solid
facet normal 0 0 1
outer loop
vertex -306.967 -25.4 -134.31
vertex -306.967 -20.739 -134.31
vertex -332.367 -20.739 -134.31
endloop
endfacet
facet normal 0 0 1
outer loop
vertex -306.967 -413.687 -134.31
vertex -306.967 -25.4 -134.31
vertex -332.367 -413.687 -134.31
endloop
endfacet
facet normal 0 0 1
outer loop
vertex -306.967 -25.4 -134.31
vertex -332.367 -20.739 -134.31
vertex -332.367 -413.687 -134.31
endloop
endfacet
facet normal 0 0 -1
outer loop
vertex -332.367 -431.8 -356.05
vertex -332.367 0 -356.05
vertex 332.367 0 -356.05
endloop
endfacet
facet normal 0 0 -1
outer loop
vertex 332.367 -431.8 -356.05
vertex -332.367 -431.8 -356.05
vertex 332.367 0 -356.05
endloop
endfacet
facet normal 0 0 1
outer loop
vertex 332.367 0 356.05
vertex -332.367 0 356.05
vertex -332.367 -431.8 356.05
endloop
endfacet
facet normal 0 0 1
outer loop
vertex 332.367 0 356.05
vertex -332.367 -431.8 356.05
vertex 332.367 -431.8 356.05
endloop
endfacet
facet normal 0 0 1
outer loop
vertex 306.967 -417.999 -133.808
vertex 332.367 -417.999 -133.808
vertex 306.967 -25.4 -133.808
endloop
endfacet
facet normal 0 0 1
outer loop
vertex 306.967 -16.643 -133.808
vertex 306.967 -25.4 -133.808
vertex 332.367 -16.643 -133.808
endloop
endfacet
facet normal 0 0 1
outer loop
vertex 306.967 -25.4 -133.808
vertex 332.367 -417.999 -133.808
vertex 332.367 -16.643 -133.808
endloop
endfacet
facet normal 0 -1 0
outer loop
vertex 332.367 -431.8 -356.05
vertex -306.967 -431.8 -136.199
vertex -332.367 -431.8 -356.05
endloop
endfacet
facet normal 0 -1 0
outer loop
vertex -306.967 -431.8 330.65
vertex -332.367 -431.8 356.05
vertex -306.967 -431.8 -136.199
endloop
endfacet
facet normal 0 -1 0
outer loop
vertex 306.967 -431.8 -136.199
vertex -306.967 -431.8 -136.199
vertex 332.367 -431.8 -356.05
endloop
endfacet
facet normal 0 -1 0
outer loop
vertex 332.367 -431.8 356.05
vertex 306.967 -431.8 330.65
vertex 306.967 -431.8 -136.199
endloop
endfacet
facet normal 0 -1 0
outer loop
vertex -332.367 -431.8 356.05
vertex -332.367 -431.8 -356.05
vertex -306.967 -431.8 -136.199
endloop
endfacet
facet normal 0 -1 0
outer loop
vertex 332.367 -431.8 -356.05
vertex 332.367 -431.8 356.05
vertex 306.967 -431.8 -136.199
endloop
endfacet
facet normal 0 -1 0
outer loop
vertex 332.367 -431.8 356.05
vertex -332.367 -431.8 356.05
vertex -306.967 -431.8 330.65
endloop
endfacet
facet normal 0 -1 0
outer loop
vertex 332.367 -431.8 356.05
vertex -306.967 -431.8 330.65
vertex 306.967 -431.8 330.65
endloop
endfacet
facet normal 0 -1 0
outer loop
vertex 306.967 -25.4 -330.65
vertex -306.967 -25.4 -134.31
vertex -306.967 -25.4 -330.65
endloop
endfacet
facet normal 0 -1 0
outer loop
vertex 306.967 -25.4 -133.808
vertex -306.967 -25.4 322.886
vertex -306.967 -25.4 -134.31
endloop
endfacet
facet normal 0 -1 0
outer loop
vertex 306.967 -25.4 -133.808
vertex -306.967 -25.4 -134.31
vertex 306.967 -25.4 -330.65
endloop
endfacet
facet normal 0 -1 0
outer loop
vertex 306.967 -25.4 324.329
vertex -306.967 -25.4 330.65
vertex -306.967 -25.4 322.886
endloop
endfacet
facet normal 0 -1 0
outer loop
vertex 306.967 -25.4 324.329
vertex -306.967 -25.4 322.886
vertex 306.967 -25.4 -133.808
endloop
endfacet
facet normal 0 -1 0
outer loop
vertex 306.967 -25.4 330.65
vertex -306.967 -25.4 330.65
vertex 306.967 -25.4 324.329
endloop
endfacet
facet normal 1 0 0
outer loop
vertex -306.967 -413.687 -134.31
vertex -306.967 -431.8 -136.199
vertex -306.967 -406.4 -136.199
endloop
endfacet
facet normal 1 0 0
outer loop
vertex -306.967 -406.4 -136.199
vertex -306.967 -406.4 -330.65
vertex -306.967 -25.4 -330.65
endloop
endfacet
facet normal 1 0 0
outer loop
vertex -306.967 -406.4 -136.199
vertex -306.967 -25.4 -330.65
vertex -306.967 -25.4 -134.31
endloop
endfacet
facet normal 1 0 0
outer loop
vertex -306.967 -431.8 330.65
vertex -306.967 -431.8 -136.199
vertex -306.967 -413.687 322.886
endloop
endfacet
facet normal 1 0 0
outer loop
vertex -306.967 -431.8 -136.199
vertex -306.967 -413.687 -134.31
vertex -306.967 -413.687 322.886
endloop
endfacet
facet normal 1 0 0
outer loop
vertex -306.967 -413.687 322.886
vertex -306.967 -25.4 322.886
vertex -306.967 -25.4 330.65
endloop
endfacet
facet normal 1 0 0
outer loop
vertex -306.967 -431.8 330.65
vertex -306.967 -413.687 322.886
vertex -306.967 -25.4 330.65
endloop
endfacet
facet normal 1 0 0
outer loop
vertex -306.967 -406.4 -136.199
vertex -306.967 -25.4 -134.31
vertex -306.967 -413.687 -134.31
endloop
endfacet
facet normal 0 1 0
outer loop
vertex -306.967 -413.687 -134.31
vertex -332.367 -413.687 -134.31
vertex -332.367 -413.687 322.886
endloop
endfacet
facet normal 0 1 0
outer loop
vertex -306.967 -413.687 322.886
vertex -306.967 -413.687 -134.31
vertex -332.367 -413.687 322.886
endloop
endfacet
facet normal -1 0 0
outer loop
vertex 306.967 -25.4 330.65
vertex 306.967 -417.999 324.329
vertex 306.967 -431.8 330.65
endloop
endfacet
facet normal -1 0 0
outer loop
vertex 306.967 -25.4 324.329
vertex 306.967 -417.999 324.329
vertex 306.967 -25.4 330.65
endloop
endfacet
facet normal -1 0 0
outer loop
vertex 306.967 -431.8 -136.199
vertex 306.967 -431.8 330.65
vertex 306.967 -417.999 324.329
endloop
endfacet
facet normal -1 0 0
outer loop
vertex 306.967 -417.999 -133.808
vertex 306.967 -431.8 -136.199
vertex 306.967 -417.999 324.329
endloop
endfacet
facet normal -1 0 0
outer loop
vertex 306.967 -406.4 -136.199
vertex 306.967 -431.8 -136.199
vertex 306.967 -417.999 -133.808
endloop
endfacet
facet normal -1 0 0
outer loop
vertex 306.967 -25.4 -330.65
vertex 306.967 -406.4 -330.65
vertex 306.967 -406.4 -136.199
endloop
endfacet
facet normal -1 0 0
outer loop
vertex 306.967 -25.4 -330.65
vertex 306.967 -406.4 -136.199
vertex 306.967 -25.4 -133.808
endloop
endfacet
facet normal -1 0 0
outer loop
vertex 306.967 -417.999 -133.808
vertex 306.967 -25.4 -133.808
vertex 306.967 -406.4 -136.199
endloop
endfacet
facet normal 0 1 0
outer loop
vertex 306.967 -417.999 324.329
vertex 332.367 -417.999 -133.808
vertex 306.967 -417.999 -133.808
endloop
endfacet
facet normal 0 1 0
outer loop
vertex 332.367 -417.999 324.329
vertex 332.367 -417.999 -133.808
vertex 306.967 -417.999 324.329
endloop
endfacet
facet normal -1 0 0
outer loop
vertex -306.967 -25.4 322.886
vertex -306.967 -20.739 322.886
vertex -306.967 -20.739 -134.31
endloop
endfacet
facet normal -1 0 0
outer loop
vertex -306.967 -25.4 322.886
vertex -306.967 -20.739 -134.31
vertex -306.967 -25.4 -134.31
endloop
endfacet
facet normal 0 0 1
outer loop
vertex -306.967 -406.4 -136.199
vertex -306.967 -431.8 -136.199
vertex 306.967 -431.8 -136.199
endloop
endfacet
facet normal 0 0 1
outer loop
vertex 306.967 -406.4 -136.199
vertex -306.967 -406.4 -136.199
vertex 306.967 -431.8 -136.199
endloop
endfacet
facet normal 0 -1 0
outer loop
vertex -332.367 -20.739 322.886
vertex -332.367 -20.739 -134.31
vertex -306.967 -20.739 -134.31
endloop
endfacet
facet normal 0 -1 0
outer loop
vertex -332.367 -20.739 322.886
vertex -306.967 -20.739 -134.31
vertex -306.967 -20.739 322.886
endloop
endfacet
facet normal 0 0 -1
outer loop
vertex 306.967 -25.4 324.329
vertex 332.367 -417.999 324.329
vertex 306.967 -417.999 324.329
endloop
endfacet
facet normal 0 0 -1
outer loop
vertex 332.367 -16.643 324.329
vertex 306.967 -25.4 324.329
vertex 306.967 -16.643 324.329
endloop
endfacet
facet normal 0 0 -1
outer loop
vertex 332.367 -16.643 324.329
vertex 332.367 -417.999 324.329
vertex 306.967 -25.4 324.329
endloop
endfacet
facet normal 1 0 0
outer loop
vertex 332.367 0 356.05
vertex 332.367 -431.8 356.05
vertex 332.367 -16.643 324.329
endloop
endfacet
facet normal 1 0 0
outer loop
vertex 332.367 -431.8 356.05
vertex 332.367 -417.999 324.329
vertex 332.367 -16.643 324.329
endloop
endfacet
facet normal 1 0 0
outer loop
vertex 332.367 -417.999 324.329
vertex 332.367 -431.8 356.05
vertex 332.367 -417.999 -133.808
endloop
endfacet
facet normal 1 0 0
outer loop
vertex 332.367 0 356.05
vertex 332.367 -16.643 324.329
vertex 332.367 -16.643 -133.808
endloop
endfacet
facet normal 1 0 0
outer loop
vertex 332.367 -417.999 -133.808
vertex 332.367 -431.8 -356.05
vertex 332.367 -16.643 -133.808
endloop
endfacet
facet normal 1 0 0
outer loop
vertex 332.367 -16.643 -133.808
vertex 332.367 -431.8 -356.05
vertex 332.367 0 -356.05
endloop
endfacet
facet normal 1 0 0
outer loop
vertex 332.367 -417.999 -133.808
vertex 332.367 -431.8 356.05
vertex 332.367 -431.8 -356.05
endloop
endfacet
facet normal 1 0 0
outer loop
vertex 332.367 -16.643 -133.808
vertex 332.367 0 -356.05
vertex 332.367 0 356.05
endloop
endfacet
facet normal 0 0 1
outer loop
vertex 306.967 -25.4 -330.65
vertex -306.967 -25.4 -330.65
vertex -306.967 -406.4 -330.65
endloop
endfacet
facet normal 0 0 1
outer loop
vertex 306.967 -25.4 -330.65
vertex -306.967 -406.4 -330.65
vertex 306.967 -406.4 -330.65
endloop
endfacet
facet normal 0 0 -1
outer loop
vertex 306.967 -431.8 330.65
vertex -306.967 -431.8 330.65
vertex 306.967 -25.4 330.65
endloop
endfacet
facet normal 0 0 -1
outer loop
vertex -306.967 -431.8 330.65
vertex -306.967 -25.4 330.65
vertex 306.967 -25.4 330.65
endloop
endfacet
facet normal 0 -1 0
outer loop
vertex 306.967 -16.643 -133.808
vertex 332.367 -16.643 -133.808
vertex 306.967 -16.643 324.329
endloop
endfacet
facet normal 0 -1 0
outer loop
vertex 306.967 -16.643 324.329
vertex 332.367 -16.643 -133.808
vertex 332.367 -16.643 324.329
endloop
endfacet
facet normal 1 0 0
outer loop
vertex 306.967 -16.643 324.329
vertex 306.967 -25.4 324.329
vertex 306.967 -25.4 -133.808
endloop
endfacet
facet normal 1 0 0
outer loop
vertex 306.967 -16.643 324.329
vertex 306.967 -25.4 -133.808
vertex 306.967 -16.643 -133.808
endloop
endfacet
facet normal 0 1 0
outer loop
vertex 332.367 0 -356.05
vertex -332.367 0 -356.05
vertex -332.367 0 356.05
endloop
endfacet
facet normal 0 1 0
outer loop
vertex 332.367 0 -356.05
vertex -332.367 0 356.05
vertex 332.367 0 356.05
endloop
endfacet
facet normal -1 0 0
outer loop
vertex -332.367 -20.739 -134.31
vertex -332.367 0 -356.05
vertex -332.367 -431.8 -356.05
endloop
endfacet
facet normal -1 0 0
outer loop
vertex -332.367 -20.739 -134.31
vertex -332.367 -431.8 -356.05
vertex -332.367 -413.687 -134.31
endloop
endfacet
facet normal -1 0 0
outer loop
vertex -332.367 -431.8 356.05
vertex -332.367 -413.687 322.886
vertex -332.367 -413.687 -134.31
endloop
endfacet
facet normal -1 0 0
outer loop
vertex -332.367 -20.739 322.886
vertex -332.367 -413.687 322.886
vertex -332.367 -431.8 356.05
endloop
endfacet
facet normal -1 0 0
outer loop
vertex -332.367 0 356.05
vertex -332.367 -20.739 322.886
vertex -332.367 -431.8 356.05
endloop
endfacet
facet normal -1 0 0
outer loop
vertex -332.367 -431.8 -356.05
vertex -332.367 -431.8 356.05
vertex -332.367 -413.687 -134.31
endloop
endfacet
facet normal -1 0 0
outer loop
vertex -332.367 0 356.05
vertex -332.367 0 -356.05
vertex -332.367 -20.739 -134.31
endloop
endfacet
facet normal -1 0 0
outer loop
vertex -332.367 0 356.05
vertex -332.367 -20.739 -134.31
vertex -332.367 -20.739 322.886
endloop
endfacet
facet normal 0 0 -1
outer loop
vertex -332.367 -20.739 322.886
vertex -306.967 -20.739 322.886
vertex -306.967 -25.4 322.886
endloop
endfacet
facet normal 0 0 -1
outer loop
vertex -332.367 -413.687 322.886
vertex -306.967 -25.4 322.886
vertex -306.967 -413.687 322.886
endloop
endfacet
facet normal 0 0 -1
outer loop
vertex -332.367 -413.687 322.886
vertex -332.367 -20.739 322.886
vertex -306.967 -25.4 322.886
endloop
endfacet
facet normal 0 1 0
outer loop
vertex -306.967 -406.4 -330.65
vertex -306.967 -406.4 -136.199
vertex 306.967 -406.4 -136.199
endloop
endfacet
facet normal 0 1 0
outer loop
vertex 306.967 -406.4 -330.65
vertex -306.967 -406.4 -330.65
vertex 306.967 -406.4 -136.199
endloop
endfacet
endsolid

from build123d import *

# Parameters (mm, degrees)
F0_W     = 664.733171463
F0_H     = 712.0994329453
F1_DEPTH = 431.8
F2_T     = -25.4
F3_W     = 613.933171463
F3_H     = 194.4507785797
F4_DEPTH = 25.4
F5_W     = 401.3557694852
F5_H     = 468.805462122
F6_DEPTH = 25.4
F7_W     = 392.9471150041
F7_H     = 457.1952670813
F8_DEPTH = 25.4
F9_DEPTH = 10.668


with BuildPart() as f1:
    # F0 (on Front) → F1 (new body)
    with BuildSketch(Plane.XZ):
        Rectangle(F0_W, F0_H)
    extrude(amount=F1_DEPTH)

    # F2
    f2_openings = [f1.faces().sort_by_distance(p)[0] for p in [
        (0, -431.8, 0),
    ]]
    offset(amount=F2_T, openings=f2_openings)

    # F3 (on face) → F4 (join)
    with BuildSketch(Plane.XZ.offset(431.8)):
        with Locations((0, -233.4243271828)):
            Rectangle(F3_W, F3_H)
    extrude(amount=-F4_DEPTH)

    # F5 (on face) → F6 (cut)
    with BuildSketch(Plane.YZ.offset(332.3665857315)):
        with Locations((-217.3207271844, 89.9267345667)):
            Rectangle(F5_W, F5_H)
    extrude(amount=-F6_DEPTH, mode=Mode.SUBTRACT)

    # F7 (on face) → F8 (cut)
    with BuildSketch(Plane(origin=(-332.3665857315, 0, 0), x_dir=(0, -1, 0), z_dir=(-1, 0, 0))):
        with Locations((217.2129563987, 94.2879095674)):
            Rectangle(F7_W, F7_H)
    extrude(amount=-F8_DEPTH, mode=Mode.SUBTRACT)

    # F9 (add): a face of the model
    f9_faces = [f1.faces().sort_by_distance(p)[0] for p in [
        (319.6665857315, -217.3207271844, -144.4759964943),
    ]]
    extrude(f9_faces, amount=F9_DEPTH)


solid = f1.part
